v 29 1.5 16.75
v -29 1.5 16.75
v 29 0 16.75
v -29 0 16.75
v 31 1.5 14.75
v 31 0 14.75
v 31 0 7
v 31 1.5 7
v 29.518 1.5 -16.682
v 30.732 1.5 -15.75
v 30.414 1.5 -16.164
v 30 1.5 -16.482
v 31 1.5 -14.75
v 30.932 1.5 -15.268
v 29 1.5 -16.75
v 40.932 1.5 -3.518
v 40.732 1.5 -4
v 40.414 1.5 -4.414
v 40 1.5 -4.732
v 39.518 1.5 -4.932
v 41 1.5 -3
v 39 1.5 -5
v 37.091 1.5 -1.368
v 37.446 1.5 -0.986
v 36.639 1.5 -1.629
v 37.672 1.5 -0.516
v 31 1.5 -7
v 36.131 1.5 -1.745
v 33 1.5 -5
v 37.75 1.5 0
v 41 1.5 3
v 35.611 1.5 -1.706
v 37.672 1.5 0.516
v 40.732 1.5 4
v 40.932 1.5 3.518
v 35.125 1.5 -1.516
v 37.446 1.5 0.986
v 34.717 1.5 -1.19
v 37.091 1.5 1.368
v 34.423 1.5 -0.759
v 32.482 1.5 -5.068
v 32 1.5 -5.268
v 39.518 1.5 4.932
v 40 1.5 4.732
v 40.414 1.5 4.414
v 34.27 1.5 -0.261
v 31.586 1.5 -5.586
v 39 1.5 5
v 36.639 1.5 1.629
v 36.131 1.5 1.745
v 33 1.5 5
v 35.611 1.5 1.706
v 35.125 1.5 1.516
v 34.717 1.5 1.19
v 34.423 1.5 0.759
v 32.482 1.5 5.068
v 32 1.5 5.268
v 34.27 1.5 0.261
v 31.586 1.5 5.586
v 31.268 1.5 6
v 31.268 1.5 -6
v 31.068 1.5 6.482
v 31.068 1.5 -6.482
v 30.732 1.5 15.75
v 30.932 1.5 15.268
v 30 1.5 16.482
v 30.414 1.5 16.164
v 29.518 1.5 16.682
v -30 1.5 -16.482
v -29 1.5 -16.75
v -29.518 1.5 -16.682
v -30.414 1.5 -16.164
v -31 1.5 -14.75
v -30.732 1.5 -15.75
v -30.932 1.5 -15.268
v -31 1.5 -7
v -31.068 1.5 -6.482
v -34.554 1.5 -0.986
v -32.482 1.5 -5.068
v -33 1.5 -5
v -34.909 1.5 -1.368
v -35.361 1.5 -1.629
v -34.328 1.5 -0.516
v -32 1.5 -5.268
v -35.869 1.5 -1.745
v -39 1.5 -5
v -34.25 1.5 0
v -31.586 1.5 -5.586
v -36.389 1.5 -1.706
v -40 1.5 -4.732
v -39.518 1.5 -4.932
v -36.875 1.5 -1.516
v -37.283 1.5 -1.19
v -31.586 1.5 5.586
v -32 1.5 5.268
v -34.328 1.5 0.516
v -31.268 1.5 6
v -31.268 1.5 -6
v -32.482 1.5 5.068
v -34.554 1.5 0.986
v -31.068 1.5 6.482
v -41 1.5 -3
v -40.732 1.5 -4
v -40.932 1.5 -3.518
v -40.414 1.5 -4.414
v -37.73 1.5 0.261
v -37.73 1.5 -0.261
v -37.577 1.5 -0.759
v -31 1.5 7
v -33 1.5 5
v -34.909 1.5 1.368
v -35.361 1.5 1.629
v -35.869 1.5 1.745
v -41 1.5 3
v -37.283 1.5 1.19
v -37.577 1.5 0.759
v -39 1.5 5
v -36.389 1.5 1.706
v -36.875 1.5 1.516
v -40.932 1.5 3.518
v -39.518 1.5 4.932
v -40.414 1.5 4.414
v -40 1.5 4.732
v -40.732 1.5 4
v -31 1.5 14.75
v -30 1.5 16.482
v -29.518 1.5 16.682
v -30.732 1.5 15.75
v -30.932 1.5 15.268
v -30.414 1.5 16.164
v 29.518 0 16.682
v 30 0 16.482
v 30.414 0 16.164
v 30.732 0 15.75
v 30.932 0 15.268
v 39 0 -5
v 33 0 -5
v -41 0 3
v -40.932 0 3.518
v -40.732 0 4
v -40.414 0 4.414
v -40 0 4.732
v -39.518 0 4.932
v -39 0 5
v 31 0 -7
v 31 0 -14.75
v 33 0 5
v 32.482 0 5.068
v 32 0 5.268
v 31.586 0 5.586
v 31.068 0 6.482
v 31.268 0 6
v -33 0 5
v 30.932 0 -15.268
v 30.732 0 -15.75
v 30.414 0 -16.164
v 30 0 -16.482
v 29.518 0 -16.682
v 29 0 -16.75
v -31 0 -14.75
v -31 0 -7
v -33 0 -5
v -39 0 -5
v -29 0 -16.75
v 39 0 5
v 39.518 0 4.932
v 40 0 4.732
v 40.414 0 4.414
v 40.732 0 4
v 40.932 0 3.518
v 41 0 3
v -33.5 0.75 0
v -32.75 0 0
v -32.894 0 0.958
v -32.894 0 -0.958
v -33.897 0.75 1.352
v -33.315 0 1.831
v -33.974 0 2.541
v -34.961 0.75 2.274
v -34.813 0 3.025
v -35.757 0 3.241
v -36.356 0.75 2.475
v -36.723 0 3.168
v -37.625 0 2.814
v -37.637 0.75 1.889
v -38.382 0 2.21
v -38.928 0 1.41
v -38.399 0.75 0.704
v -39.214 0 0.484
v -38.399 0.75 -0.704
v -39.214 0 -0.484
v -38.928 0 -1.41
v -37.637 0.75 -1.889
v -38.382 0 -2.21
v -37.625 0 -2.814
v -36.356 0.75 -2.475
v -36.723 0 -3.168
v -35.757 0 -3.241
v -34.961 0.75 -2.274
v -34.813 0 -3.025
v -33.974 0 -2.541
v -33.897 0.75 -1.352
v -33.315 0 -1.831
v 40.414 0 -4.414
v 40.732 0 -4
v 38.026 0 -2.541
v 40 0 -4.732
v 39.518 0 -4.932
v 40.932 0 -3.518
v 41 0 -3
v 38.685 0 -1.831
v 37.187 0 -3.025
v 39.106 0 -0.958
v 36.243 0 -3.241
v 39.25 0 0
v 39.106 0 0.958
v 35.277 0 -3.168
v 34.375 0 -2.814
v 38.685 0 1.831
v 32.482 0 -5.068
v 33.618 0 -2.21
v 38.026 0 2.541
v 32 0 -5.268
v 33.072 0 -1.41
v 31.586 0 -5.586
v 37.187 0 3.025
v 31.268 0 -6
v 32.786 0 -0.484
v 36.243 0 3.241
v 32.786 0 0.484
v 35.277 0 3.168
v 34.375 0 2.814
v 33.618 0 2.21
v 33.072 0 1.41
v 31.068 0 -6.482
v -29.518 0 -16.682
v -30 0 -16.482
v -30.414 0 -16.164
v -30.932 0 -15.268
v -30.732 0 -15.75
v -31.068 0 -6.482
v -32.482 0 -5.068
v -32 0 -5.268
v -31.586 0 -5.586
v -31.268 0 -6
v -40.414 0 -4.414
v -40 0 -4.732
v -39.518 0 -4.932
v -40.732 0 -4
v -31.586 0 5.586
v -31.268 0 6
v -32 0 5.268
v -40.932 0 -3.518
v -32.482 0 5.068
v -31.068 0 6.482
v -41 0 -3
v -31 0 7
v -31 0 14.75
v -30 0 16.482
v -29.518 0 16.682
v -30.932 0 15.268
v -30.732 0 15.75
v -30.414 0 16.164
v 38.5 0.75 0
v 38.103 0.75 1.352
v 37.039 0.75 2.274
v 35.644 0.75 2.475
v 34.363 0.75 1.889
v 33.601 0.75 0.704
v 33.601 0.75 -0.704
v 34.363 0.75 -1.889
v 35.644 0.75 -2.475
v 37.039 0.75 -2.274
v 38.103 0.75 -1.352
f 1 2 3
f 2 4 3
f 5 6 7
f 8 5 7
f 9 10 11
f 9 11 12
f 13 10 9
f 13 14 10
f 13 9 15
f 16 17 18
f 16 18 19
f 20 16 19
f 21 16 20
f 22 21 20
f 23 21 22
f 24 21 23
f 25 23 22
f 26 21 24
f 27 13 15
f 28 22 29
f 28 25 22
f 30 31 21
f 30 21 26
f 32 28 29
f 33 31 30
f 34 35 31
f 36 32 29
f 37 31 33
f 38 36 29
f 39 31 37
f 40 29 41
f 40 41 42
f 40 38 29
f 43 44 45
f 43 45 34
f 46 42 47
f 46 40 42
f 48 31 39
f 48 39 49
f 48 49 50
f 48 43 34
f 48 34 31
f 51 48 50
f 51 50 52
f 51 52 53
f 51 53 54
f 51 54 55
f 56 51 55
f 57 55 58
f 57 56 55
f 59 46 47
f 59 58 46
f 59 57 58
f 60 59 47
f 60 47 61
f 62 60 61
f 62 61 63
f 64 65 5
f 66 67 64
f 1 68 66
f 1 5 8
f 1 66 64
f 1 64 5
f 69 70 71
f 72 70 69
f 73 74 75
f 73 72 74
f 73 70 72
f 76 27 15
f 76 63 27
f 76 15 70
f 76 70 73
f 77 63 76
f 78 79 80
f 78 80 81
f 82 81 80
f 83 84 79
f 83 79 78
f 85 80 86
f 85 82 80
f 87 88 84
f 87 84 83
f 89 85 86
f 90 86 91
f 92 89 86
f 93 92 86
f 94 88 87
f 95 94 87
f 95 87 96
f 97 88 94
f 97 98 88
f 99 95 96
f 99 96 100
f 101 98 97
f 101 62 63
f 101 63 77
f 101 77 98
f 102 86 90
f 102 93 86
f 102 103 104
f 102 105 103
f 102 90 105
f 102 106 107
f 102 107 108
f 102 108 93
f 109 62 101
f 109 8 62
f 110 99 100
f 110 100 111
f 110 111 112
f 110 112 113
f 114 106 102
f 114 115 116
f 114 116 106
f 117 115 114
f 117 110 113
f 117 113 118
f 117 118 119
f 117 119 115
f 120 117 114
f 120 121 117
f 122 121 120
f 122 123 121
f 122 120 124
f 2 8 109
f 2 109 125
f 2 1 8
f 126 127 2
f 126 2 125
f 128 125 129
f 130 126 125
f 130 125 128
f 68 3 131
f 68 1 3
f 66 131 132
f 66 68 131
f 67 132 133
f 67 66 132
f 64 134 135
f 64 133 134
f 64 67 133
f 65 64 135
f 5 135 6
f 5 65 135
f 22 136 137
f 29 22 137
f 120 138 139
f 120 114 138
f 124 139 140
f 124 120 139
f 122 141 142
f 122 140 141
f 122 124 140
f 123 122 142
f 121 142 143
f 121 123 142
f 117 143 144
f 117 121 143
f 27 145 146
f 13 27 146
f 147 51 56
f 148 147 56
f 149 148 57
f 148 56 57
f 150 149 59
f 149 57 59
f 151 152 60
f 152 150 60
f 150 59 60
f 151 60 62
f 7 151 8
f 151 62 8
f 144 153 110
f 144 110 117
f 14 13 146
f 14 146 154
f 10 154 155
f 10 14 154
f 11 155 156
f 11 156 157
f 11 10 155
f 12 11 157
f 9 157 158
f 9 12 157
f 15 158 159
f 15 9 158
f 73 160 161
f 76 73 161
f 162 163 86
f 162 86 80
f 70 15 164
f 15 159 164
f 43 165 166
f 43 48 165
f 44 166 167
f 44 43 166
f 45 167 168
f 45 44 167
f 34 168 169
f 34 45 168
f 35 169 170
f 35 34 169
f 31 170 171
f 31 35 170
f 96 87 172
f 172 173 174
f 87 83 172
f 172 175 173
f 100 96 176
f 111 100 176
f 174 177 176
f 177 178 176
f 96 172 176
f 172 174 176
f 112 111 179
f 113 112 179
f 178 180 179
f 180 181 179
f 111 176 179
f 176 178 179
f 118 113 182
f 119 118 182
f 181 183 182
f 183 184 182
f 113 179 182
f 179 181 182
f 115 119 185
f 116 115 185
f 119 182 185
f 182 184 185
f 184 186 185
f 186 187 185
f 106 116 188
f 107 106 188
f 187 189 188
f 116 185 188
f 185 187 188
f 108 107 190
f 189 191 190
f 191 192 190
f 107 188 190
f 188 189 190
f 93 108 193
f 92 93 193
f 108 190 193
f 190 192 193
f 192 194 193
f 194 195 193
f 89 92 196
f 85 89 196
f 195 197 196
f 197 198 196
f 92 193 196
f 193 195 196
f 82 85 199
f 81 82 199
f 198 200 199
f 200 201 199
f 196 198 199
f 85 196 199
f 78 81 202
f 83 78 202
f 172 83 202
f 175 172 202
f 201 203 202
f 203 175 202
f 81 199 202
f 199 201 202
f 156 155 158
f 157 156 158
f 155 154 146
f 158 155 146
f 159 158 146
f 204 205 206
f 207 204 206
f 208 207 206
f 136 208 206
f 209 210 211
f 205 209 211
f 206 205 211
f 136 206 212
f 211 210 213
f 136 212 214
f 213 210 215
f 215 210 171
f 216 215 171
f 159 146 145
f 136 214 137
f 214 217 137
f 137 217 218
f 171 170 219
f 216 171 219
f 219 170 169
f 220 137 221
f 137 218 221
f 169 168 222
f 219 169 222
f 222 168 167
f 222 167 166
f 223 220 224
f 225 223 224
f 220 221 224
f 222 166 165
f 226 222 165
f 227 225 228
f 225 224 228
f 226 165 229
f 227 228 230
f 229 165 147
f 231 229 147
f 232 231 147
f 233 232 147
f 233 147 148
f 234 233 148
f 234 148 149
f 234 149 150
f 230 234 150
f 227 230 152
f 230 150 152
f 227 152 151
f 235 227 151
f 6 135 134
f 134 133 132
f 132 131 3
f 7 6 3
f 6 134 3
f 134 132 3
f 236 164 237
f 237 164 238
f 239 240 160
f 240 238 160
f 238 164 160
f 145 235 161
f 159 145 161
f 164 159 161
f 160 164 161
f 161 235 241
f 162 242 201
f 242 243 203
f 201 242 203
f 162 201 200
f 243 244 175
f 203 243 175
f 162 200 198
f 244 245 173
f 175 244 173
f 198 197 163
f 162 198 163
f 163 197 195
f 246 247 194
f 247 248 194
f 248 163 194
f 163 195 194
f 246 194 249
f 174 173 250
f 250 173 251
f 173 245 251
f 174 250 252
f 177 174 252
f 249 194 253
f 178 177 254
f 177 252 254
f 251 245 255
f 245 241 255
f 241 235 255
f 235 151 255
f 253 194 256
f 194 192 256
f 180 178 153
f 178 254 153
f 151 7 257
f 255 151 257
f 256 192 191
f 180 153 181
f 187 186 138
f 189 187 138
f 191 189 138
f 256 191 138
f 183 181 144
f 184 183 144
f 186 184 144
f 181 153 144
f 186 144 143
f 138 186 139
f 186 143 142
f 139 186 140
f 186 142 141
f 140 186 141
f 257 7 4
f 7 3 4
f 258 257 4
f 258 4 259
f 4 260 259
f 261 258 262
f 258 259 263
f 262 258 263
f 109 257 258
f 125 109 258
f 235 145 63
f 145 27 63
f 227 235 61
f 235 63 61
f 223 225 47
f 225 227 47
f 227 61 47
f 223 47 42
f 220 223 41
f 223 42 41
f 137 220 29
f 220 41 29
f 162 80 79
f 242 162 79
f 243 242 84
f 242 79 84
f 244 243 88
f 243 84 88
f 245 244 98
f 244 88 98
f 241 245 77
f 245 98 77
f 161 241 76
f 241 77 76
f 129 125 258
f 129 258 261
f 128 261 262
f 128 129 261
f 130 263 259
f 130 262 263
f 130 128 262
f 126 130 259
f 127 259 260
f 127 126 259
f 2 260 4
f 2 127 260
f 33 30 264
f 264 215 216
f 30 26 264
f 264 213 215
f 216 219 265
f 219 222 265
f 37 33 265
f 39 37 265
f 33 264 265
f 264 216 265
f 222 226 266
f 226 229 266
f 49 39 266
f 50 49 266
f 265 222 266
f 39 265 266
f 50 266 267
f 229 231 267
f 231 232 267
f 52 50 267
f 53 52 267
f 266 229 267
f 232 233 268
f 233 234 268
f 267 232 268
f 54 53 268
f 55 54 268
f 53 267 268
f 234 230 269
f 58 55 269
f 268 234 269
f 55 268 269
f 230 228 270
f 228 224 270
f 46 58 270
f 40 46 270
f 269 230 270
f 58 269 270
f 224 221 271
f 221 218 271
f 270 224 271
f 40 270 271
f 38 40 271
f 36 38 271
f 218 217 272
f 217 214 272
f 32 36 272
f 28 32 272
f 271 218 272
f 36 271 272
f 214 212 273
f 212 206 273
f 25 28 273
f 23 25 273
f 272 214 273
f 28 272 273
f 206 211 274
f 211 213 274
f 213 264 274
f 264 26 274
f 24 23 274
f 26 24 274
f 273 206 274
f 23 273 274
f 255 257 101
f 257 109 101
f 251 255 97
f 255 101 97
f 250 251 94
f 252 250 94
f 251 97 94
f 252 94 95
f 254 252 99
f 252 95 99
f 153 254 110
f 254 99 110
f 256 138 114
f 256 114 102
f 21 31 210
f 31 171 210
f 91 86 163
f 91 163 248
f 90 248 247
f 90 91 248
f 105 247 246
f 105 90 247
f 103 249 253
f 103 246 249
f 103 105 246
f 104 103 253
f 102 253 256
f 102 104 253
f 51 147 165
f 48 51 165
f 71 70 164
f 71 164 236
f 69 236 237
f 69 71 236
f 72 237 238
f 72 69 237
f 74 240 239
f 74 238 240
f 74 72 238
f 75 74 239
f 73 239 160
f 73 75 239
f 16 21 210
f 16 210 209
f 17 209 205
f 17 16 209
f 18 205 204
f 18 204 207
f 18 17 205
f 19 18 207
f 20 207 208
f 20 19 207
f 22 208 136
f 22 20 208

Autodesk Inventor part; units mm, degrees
ref_plane "YZ Plane" through (0, 0, 0) normal (1, 0, 0) x (0, 1, 0)
ref_plane "XZ Plane" through (0, 0, 0) normal (0, 1, 0) x (-1, 0, 0)
ref_plane "XY Plane" through (0, 0, 0) normal (0, 0, 1) x (1, 0, 0)
sketch "Sketch1" plane through (0, 0, 0) normal (0, 1, 0) x (-1, 0, 0)
  line L0 (-31, -16.75) -> (31, -16.75)
  line L1 (31, -16.75) -> (31, 16.75)
  line L2 (31, 16.75) -> (-31, 16.75)
  line L3 (-31, 16.75) -> (-31, -16.75)
  line L4 (-31, -16.75) -> (31, 16.75) construction
  line L5 (31, -16.75) -> (-31, 16.75) construction
  point P0 (0, 0)
  dimension "d0" = 33.5
  dimension "d1" = 62
extrude "Extrusion1" add sketch "Sketch1" along normal blind 1.5
fillet "Fillet1" radius 2 4 edges at (31, 0.75, 16.75) (31, 0.75, -16.75) (-31, 0.75, -16.75) (-31, 0.75, 16.75)
sketch "Sketch5" plane through (0, 0, 0) normal (0, -1, 0) x (1, 0, 0)
  line L0 (41, -5) -> (31, -5)
  line L1 (31, -5) -> (31, 5)
  line L2 (31, 5) -> (41, 5)
  line L3 (41, 5) -> (41, -5)
  line L4 (41, -5) -> (31, 5) construction
  line L5 (31, -5) -> (41, 5) construction
  line L6 (31, 14.75) -> (31, -14.75) projected
  line L7 (-41, -5) -> (-31, -5)
  line L8 (-31, -5) -> (-31, 5)
  line L9 (-31, 5) -> (-41, 5)
  line L10 (-41, 5) -> (-41, -5)
  line L11 (-41, -5) -> (-31, 5) construction
  line L12 (-31, -5) -> (-41, 5) construction
  line L13 (-31, -14.75) -> (-31, 14.75) projected
  point P0 (0, 0)
  point P1 (36, 0)
  point P2 (36, 0)
  point P3 (-36, 0)
  point P4 (-36, 0)
  dimension "d37" = 10
  dimension "d38" = 10
extrude "Extrusion6" add sketch "Sketch5" against normal up to surface (1.5 mm away)
sketch "Sketch6" plane through (0, 0, 0) normal (0, -1, 0) x (1, 0, 0)
  circle A0 centre (36, 0) radius 1.75
  line L0 (31, 14.75) -> (31, 5) projected
  circle A1 centre (-36, 0) radius 1.75
  line L1 (-31, 5) -> (-31, 14.75) projected
  point P0 (0, 0)
  dimension "d41" = 3.5
  dimension "d42" = 5
  dimension "d51" = 5
extrude "Extrusion7" cut sketch "Sketch6" against normal up to surface (1.5 mm away)
fillet "Fillet6" radius 2 8 edges at (31, 0.75, 5) (41, 0.75, 5) (41, 0.75, -5) (31, 0.75, -5) (-31, 0.75, 5) (-41, 0.75, 5) (-41, 0.75, -5) (-31, 0.75, -5)
chamfer "Chamfer1" distance 1.5 angle 45 2 edges at (34.25, 0, 0) (-37.75, 0, 0)
equation "\"d51\" = d42"
properties part number "BatteryPlate"
